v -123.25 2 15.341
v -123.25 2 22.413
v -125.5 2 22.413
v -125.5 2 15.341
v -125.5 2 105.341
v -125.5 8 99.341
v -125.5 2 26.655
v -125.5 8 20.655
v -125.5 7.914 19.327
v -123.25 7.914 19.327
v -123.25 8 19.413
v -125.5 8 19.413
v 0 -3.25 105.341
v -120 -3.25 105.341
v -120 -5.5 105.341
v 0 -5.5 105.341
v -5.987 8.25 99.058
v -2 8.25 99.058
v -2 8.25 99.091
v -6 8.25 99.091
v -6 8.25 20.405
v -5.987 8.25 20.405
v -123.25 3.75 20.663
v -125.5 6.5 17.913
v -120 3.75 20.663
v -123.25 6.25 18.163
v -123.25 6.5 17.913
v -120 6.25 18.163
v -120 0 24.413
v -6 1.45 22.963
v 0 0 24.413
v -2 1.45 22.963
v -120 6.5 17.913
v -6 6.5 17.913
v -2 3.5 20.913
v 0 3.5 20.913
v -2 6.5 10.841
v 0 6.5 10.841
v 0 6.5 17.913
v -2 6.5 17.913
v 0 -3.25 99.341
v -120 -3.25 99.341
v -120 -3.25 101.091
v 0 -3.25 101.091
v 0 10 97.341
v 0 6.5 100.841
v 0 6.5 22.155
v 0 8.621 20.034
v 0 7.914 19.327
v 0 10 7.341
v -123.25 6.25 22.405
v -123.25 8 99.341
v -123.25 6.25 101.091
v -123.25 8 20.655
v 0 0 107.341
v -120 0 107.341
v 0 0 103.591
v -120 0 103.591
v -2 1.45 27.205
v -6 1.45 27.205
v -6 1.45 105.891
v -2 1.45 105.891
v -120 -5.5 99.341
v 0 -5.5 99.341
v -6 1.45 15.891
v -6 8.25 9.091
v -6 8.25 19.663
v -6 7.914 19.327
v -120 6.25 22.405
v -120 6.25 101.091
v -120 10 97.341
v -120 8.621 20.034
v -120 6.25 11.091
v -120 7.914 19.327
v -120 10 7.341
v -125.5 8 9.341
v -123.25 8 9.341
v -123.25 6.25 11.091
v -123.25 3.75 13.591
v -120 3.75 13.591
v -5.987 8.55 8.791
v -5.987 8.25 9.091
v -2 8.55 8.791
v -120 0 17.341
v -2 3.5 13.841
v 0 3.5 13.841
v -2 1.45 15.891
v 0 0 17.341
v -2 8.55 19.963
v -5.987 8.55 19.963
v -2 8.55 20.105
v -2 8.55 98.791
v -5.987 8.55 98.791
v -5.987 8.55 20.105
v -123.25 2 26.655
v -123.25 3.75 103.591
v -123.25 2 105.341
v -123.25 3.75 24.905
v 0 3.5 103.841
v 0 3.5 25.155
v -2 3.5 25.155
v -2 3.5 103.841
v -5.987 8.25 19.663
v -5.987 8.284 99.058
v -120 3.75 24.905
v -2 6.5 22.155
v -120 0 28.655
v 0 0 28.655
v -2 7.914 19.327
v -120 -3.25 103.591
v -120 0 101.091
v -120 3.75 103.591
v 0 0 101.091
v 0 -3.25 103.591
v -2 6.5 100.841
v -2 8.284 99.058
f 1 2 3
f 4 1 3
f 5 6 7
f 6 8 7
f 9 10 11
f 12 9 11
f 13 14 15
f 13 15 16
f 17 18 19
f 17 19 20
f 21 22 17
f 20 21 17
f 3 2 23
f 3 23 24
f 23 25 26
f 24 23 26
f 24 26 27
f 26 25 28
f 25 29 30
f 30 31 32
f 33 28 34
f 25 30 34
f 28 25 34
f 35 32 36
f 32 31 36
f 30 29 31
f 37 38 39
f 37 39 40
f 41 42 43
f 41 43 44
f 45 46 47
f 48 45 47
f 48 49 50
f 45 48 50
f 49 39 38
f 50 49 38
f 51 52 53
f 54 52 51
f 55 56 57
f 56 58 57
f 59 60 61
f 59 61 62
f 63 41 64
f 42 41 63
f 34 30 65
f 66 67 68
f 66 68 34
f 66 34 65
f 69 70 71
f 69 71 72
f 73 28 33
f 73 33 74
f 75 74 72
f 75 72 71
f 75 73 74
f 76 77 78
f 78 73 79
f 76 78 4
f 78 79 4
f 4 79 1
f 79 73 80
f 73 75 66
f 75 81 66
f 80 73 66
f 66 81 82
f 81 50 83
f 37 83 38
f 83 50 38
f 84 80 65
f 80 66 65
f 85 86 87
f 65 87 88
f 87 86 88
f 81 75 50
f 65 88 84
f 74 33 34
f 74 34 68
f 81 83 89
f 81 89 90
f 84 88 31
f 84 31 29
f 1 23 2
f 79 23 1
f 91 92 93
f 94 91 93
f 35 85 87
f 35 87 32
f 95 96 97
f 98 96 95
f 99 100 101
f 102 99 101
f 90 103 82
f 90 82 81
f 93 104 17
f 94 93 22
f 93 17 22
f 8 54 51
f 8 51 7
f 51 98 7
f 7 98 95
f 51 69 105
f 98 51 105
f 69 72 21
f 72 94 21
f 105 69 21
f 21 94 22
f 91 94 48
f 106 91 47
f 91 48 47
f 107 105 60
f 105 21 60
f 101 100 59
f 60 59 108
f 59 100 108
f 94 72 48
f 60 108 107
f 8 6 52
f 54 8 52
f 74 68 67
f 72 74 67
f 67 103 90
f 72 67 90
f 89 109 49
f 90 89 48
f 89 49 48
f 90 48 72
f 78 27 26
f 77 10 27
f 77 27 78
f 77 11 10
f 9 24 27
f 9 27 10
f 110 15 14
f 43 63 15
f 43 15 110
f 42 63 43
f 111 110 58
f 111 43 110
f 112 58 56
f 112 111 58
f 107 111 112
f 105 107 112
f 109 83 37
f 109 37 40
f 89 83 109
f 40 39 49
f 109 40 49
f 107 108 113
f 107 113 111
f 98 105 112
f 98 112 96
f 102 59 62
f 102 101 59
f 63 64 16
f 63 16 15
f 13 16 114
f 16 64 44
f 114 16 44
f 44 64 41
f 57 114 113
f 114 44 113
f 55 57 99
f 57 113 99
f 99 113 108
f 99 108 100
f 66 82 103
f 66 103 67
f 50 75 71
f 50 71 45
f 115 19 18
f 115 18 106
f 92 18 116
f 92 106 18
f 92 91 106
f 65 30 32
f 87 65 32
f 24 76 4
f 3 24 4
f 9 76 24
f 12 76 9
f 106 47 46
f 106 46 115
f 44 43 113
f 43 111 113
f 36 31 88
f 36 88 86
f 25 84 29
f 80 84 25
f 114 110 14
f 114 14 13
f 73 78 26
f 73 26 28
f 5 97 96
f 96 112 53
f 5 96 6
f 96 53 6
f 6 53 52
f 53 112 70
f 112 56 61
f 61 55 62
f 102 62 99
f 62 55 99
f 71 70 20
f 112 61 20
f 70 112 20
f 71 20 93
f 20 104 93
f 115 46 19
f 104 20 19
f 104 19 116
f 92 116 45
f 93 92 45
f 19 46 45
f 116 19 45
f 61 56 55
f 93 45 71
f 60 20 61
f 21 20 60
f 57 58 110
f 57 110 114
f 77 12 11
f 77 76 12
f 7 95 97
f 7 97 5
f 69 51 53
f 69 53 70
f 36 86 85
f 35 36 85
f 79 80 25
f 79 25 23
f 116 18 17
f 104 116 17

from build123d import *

# Parameters (mm, degrees)
SKETCH1_W           = 120
SKETCH1_H           = 100
BOSS_EXTRUDE1_DEPTH = 10
SKETCH2_W           = 6
SKETCH2_H           = 3
CUT_EXTRUDE1_DEPTH  = 120
SKETCH3_W           = 3
SKETCH3_H           = 1.75
CUT_EXTRUDE2_DEPTH  = 120
SKETCH4_W           = 3
SKETCH4_H           = 1.75
CUT_EXTRUDE3_DEPTH  = 120
SKETCH5_W           = 100
SKETCH5_H           = 3
BOSS_EXTRUDE2_DEPTH = 6
SKETCH6_W           = 3
SKETCH6_H           = 100
BOSS_EXTRUDE3_DEPTH = 1.75
SKETCH8_W           = 3
SKETCH8_H           = 100
BOSS_EXTRUDE4_DEPTH = 1.75
CUT_EXTRUDE4_DEPTH  = 140
CUT_EXTRUDE5_DEPTH  = 140
SKETCH12_W          = 120
SKETCH12_H          = 3
BOSS_EXTRUDE5_DEPTH = 6
SKETCH13_W          = 120
SKETCH13_H          = 3
BOSS_EXTRUDE6_DEPTH = 1.75
SKETCH14_W          = 120
SKETCH14_H          = 3
BOSS_EXTRUDE7_DEPTH = 1.75
SKETCH15_W          = 3.971349668
SKETCH15_H          = 100.27962334
CUT_EXTRUDE7_DEPTH  = 0.25
SKETCH16_W          = 3.977727367
SKETCH16_H          = 100.113606744
CUT_EXTRUDE8_DEPTH  = 0.25
SKETCH18_W          = 99.392543401
SKETCH18_H          = 7.459446395
CUT_EXTRUDE9_DEPTH  = 0.25
SKETCH19_W          = 3
SKETCH19_H          = 91.258373497
CUT_EXTRUDE10_DEPTH = 0.25
SKETCH22_W          = 3
SKETCH22_H          = 105.56058455
CUT_EXTRUDE11_DEPTH = 0.25
SKETCH23_W          = 145.417072626
SKETCH23_H          = 16.376201687
CUT_EXTRUDE12_DEPTH = 0.25
SKETCH24_W          = 92.054908244
SKETCH24_H          = 1.75
CUT_EXTRUDE13_DEPTH = 0.25
SKETCH25_W          = 91.75
SKETCH25_H          = 1.75
CUT_EXTRUDE14_DEPTH = 0.25
SKETCH27_W          = 146.123968395
SKETCH27_H          = 10.969132505
CUT_EXTRUDE15_DEPTH = 0.25
SKETCH28_W          = 131.910387722
SKETCH28_H          = 9.70209764
CUT_EXTRUDE16_DEPTH = 0.25
SKETCH29_W          = 147.06215687
SKETCH29_H          = 25.738379838
CUT_EXTRUDE17_DEPTH = 0.25
SKETCH30_W          = 120
SKETCH30_H          = 3
CUT_EXTRUDE18_DEPTH = 0.25
SKETCH31_W          = 120
SKETCH31_H          = 3
CUT_EXTRUDE19_DEPTH = 0.25
SKETCH32_W          = 120
SKETCH32_H          = 1.75
CUT_EXTRUDE20_DEPTH = 0.25
SKETCH33_W          = 120
SKETCH33_H          = 1.75
CUT_EXTRUDE21_DEPTH = 0.25
SKETCH36_W          = 96.5
SKETCH36_H          = 6.5
CUT_EXTRUDE23_DEPTH = 0.5
SKETCH39_W          = 96.5
SKETCH39_H          = 6.5
CUT_EXTRUDE27_DEPTH = 0.5
SKETCH41_W          = 4
SKETCH41_H          = 91.70363903
CUT_EXTRUDE28_DEPTH = 0.3
SKETCH42_W          = 3.987472746
SKETCH42_H          = 92.170181705
CUT_EXTRUDE29_DEPTH = 0.3
CUT_EXTRUDE30_DEPTH = 150
SKETCH44_W          = 120
SKETCH44_H          = 6
CUT_EXTRUDE31_DEPTH = 0.25
CUT_EXTRUDE32_DEPTH = 150


with BuildPart() as part:
    # Sketch1 → Boss-Extrude1 (new body)
    with BuildSketch(Plane(origin=(0, 0, 0), x_dir=(1, 0, 0), z_dir=(0, 1, 0))):
        with Locations((-60, -57.341499956)):
            Rectangle(SKETCH1_W, SKETCH1_H)
    extrude(amount=BOSS_EXTRUDE1_DEPTH)

    # Sketch2 → Cut-Extrude1 (cut)
    with BuildSketch(Plane(origin=(0, 0, 7.341499956), x_dir=(-1, 0, 0), z_dir=(0, 0, -1))):
        with Locations((3, 5)):
            Rectangle(SKETCH2_W, SKETCH2_H)
    extrude(amount=-CUT_EXTRUDE1_DEPTH, mode=Mode.SUBTRACT)

    # Sketch3 → Cut-Extrude2 (cut)
    with BuildSketch(Plane(origin=(0, 0, 7.341499956), x_dir=(-1, 0, 0), z_dir=(0, 0, -1))):
        with Locations((4.5, 7.375)):
            Rectangle(SKETCH3_W, SKETCH3_H)
    extrude(amount=-CUT_EXTRUDE2_DEPTH, mode=Mode.SUBTRACT)

    # Sketch4 → Cut-Extrude3 (cut)
    with BuildSketch(Plane(origin=(0, 0, 7.341499956), x_dir=(-1, 0, 0), z_dir=(0, 0, -1))):
        with Locations((4.5, 2.625)):
            Rectangle(SKETCH4_W, SKETCH4_H)
    extrude(amount=-CUT_EXTRUDE3_DEPTH, mode=Mode.SUBTRACT)

    # Sketch5 → Boss-Extrude2 (add)
    with BuildSketch(Plane.ZY.offset(120)):
        with Locations((57.341499956, 5)):
            Rectangle(SKETCH5_W, SKETCH5_H)
    extrude(amount=BOSS_EXTRUDE2_DEPTH)

    # Sketch6 → Boss-Extrude3 (add)
    with BuildSketch(Plane(origin=(0, 3.5, 0), x_dir=(-1, 0, 0), z_dir=(0, -1, 0))):
        with Locations((124.5, -57.341499956)):
            Rectangle(SKETCH6_W, SKETCH6_H)
    extrude(amount=BOSS_EXTRUDE3_DEPTH)

    # Sketch8 → Boss-Extrude4 (add)
    with BuildSketch(Plane(origin=(0, 6.5, 0), x_dir=(1, 0, 0), z_dir=(0, 1, 0))):
        with Locations((-124.5, -57.341499956)):
            Rectangle(SKETCH8_W, SKETCH8_H)
    extrude(amount=BOSS_EXTRUDE4_DEPTH)

    # Sketch9 → Cut-Extrude4 (cut)
    with BuildSketch(Plane(origin=(0, 0, 0), x_dir=(0, 0, -1), z_dir=(1, 0, 0))):
        Polygon((-7.341499956, 0), (-7.341499956, 10), (-17.341499956, 0), align=None)
    extrude(amount=-CUT_EXTRUDE4_DEPTH, mode=Mode.SUBTRACT)

    # Sketch10 → Cut-Extrude5 (cut)
    with BuildSketch(Plane(origin=(0, 0, 0), x_dir=(0, 0, -1), z_dir=(1, 0, 0))):
        Polygon((-107.341499956, 10), (-107.341499956, 0), (-97.341499956, 10), align=None)
    extrude(amount=-CUT_EXTRUDE5_DEPTH, mode=Mode.SUBTRACT)

    # Sketch12 → Boss-Extrude5 (add)
    with BuildSketch(Plane(origin=(0, 0, 0), x_dir=(-1, 0, 0), z_dir=(0, -1, 0))):
        with Locations((60, -102.341499956)):
            Rectangle(SKETCH12_W, SKETCH12_H)
    extrude(amount=BOSS_EXTRUDE5_DEPTH)

    # Sketch13 → Boss-Extrude6 (add)
    with BuildSketch(Plane(origin=(0, 0, 100.841499956), x_dir=(-1, 0, 0), z_dir=(0, 0, -1))):
        with Locations((60, -4.5)):
            Rectangle(SKETCH13_W, SKETCH13_H)
    extrude(amount=BOSS_EXTRUDE6_DEPTH)

    # Sketch14 → Boss-Extrude7 (add)
    with BuildSketch(Plane.XY.offset(103.841499956)):
        with Locations((-60, -4.5)):
            Rectangle(SKETCH14_W, SKETCH14_H)
    extrude(amount=BOSS_EXTRUDE7_DEPTH)

    # Sketch15 → Cut-Extrude7 (cut)
    with BuildSketch(Plane(origin=(0, 1.75, 0), x_dir=(-1, 0, 0), z_dir=(0, -1, 0))):
        with Locations((124.014325166, -55.451688286)):
            Rectangle(SKETCH15_W, SKETCH15_H)
    extrude(amount=-CUT_EXTRUDE7_DEPTH, mode=Mode.SUBTRACT)

    # Sketch16 → Cut-Extrude8 (cut)
    with BuildSketch(Plane(origin=(0, 8.25, 0), x_dir=(1, 0, 0), z_dir=(0, 1, 0))):
        with Locations((-124.011136317, -59.148303328)):
            Rectangle(SKETCH16_W, SKETCH16_H)
    extrude(amount=-CUT_EXTRUDE8_DEPTH, mode=Mode.SUBTRACT)

    # Sketch18 → Cut-Extrude9 (cut)
    with BuildSketch(Plane.ZY.offset(126)):
        with Locations((55.645228256, 5.729723198)):
            Rectangle(SKETCH18_W, SKETCH18_H)
    extrude(amount=-CUT_EXTRUDE9_DEPTH, mode=Mode.SUBTRACT)

    # Sketch19 → Cut-Extrude10 (cut)
    with BuildSketch(Plane(origin=(0, 6.5, 0), x_dir=(1, 0, 0), z_dir=(0, 1, 0))):
        with Locations((-121.5, -56.470686704)):
            Rectangle(SKETCH19_W, SKETCH19_H)
    extrude(amount=-CUT_EXTRUDE10_DEPTH, mode=Mode.SUBTRACT)

    # Sketch22 → Cut-Extrude11 (cut)
    with BuildSketch(Plane(origin=(0, 3.5, 0), x_dir=(-1, 0, 0), z_dir=(0, -1, 0))):
        with Locations((121.5, -51.061207681)):
            Rectangle(SKETCH22_W, SKETCH22_H)
    extrude(amount=-CUT_EXTRUDE11_DEPTH, mode=Mode.SUBTRACT)

    # Sketch23 → Cut-Extrude12 (cut)
    with BuildSketch(Plane.ZY.offset(125.75)):
        with Locations((82.050036269, -0.188100844)):
            Rectangle(SKETCH23_W, SKETCH23_H)
    extrude(amount=-CUT_EXTRUDE12_DEPTH, mode=Mode.SUBTRACT)

    # Sketch24 → Cut-Extrude13 (cut)
    with BuildSketch(Plane(origin=(-123, 0, 0), x_dir=(0, 0, -1), z_dir=(1, 0, 0))):
        with Locations((-59.314045834, 2.875)):
            Rectangle(SKETCH24_W, SKETCH24_H)
    extrude(amount=-CUT_EXTRUDE13_DEPTH, mode=Mode.SUBTRACT)

    # Sketch25 → Cut-Extrude14 (cut)
    with BuildSketch(Plane(origin=(-123, 0, 0), x_dir=(0, 0, -1), z_dir=(1, 0, 0))):
        with Locations((-55.216499956, 7.125)):
            Rectangle(SKETCH25_W, SKETCH25_H)
    extrude(amount=-CUT_EXTRUDE14_DEPTH, mode=Mode.SUBTRACT)

    # Sketch27 → Cut-Extrude15 (cut)
    with BuildSketch(Plane(origin=(0, -6, 0), x_dir=(-1, 0, 0), z_dir=(0, -1, 0))):
        with Locations((46.938015803, -100.106933704)):
            Rectangle(SKETCH27_W, SKETCH27_H)
    extrude(amount=-CUT_EXTRUDE15_DEPTH, mode=Mode.SUBTRACT)

    # Sketch28 → Cut-Extrude16 (cut)
    with BuildSketch(Plane.XY.offset(105.591499956)):
        with Locations((-65.955193861, -7.85104882)):
            Rectangle(SKETCH28_W, SKETCH28_H)
    extrude(amount=-CUT_EXTRUDE16_DEPTH, mode=Mode.SUBTRACT)

    # Sketch29 → Cut-Extrude17 (cut)
    with BuildSketch(Plane(origin=(0, 0, 99.091499956), x_dir=(-1, 0, 0), z_dir=(0, 0, -1))):
        with Locations((46.468921565, -15.869189919)):
            Rectangle(SKETCH29_W, SKETCH29_H)
    extrude(amount=-CUT_EXTRUDE17_DEPTH, mode=Mode.SUBTRACT)

    # Sketch30 → Cut-Extrude18 (cut)
    with BuildSketch(Plane(origin=(0, 0, 100.841499956), x_dir=(-1, 0, 0), z_dir=(0, 0, -1))):
        with Locations((60, -1.5)):
            Rectangle(SKETCH30_W, SKETCH30_H)
    extrude(amount=-CUT_EXTRUDE18_DEPTH, mode=Mode.SUBTRACT)

    # Sketch31 → Cut-Extrude19 (cut)
    with BuildSketch(Plane.XY.offset(103.841499956)):
        with Locations((-60, -1.5)):
            Rectangle(SKETCH31_W, SKETCH31_H)
    extrude(amount=-CUT_EXTRUDE19_DEPTH, mode=Mode.SUBTRACT)

    # Sketch32 → Cut-Extrude20 (cut)
    with BuildSketch(Plane(origin=(0, -3, 0), x_dir=(1, 0, 0), z_dir=(0, 1, 0))):
        with Locations((-60, -104.466499956)):
            Rectangle(SKETCH32_W, SKETCH32_H)
    extrude(amount=-CUT_EXTRUDE20_DEPTH, mode=Mode.SUBTRACT)

    # Sketch33 → Cut-Extrude21 (cut)
    with BuildSketch(Plane(origin=(0, -3, 0), x_dir=(1, 0, 0), z_dir=(0, 1, 0))):
        with Locations((-60, -100.216499956)):
            Rectangle(SKETCH33_W, SKETCH33_H)
    extrude(amount=-CUT_EXTRUDE21_DEPTH, mode=Mode.SUBTRACT)

    # Sketch36 → Cut-Extrude23 (cut)
    with BuildSketch(Plane.ZY.offset(3)):
        with Locations((57.341499956, 5)):
            Rectangle(SKETCH36_W, SKETCH36_H)
    extrude(amount=-CUT_EXTRUDE23_DEPTH, mode=Mode.SUBTRACT)

    # Sketch39 → Cut-Extrude27 (cut)
    with BuildSketch(Plane.ZY.offset(2.5)):
        with Locations((57.341499956, 5)):
            Rectangle(SKETCH39_W, SKETCH39_H)
    extrude(amount=-CUT_EXTRUDE27_DEPTH, mode=Mode.SUBTRACT)

    # Sketch41 → Cut-Extrude28 (cut)
    with BuildSketch(Plane(origin=(0, 1.75, 0), x_dir=(1, 0, 0), z_dir=(0, 1, 0))):
        with Locations((-4, -61.443319471)):
            Rectangle(SKETCH41_W, SKETCH41_H)
    extrude(amount=-CUT_EXTRUDE28_DEPTH, mode=Mode.SUBTRACT)

    # Sketch42 → Cut-Extrude29 (cut)
    with BuildSketch(Plane(origin=(0, 8.25, 0), x_dir=(-1, 0, 0), z_dir=(0, -1, 0))):
        with Locations((3.993736373, -52.972884842)):
            Rectangle(SKETCH42_W, SKETCH42_H)
    extrude(amount=-CUT_EXTRUDE29_DEPTH, mode=Mode.SUBTRACT)

    # Sketch43 → Cut-Extrude30 (cut)
    with BuildSketch(Plane(origin=(0, 0, 0), x_dir=(0, 0, -1), z_dir=(1, 0, 0))):
        Polygon((-19.32678133, 7.914213562), (-33.468916954, -6.227922061), (-32.054703391, -7.642135624), (-17.912567767, 6.5), align=None)
    extrude(amount=-CUT_EXTRUDE30_DEPTH, mode=Mode.SUBTRACT)

    # Sketch44 → Cut-Extrude31 (cut)
    with BuildSketch(Plane(origin=(0, -5.75, 0), x_dir=(-1, 0, 0), z_dir=(0, -1, 0))):
        with Locations((60, -102.341499956)):
            Rectangle(SKETCH44_W, SKETCH44_H)
    extrude(amount=-CUT_EXTRUDE31_DEPTH, mode=Mode.SUBTRACT)

    # Sketch45 → Cut-Extrude32 (cut)
    with BuildSketch(Plane(origin=(0, 0, 0), x_dir=(0, 0, -1), z_dir=(1, 0, 0))):
        Polygon((-19.32678133, 7.914213562), (-20.033888111, 8.621320344), (-29.487832781, -0.832624327), (-28.780726, -1.539731108), align=None)
    extrude(amount=-CUT_EXTRUDE32_DEPTH, mode=Mode.SUBTRACT)


solid = part.part
